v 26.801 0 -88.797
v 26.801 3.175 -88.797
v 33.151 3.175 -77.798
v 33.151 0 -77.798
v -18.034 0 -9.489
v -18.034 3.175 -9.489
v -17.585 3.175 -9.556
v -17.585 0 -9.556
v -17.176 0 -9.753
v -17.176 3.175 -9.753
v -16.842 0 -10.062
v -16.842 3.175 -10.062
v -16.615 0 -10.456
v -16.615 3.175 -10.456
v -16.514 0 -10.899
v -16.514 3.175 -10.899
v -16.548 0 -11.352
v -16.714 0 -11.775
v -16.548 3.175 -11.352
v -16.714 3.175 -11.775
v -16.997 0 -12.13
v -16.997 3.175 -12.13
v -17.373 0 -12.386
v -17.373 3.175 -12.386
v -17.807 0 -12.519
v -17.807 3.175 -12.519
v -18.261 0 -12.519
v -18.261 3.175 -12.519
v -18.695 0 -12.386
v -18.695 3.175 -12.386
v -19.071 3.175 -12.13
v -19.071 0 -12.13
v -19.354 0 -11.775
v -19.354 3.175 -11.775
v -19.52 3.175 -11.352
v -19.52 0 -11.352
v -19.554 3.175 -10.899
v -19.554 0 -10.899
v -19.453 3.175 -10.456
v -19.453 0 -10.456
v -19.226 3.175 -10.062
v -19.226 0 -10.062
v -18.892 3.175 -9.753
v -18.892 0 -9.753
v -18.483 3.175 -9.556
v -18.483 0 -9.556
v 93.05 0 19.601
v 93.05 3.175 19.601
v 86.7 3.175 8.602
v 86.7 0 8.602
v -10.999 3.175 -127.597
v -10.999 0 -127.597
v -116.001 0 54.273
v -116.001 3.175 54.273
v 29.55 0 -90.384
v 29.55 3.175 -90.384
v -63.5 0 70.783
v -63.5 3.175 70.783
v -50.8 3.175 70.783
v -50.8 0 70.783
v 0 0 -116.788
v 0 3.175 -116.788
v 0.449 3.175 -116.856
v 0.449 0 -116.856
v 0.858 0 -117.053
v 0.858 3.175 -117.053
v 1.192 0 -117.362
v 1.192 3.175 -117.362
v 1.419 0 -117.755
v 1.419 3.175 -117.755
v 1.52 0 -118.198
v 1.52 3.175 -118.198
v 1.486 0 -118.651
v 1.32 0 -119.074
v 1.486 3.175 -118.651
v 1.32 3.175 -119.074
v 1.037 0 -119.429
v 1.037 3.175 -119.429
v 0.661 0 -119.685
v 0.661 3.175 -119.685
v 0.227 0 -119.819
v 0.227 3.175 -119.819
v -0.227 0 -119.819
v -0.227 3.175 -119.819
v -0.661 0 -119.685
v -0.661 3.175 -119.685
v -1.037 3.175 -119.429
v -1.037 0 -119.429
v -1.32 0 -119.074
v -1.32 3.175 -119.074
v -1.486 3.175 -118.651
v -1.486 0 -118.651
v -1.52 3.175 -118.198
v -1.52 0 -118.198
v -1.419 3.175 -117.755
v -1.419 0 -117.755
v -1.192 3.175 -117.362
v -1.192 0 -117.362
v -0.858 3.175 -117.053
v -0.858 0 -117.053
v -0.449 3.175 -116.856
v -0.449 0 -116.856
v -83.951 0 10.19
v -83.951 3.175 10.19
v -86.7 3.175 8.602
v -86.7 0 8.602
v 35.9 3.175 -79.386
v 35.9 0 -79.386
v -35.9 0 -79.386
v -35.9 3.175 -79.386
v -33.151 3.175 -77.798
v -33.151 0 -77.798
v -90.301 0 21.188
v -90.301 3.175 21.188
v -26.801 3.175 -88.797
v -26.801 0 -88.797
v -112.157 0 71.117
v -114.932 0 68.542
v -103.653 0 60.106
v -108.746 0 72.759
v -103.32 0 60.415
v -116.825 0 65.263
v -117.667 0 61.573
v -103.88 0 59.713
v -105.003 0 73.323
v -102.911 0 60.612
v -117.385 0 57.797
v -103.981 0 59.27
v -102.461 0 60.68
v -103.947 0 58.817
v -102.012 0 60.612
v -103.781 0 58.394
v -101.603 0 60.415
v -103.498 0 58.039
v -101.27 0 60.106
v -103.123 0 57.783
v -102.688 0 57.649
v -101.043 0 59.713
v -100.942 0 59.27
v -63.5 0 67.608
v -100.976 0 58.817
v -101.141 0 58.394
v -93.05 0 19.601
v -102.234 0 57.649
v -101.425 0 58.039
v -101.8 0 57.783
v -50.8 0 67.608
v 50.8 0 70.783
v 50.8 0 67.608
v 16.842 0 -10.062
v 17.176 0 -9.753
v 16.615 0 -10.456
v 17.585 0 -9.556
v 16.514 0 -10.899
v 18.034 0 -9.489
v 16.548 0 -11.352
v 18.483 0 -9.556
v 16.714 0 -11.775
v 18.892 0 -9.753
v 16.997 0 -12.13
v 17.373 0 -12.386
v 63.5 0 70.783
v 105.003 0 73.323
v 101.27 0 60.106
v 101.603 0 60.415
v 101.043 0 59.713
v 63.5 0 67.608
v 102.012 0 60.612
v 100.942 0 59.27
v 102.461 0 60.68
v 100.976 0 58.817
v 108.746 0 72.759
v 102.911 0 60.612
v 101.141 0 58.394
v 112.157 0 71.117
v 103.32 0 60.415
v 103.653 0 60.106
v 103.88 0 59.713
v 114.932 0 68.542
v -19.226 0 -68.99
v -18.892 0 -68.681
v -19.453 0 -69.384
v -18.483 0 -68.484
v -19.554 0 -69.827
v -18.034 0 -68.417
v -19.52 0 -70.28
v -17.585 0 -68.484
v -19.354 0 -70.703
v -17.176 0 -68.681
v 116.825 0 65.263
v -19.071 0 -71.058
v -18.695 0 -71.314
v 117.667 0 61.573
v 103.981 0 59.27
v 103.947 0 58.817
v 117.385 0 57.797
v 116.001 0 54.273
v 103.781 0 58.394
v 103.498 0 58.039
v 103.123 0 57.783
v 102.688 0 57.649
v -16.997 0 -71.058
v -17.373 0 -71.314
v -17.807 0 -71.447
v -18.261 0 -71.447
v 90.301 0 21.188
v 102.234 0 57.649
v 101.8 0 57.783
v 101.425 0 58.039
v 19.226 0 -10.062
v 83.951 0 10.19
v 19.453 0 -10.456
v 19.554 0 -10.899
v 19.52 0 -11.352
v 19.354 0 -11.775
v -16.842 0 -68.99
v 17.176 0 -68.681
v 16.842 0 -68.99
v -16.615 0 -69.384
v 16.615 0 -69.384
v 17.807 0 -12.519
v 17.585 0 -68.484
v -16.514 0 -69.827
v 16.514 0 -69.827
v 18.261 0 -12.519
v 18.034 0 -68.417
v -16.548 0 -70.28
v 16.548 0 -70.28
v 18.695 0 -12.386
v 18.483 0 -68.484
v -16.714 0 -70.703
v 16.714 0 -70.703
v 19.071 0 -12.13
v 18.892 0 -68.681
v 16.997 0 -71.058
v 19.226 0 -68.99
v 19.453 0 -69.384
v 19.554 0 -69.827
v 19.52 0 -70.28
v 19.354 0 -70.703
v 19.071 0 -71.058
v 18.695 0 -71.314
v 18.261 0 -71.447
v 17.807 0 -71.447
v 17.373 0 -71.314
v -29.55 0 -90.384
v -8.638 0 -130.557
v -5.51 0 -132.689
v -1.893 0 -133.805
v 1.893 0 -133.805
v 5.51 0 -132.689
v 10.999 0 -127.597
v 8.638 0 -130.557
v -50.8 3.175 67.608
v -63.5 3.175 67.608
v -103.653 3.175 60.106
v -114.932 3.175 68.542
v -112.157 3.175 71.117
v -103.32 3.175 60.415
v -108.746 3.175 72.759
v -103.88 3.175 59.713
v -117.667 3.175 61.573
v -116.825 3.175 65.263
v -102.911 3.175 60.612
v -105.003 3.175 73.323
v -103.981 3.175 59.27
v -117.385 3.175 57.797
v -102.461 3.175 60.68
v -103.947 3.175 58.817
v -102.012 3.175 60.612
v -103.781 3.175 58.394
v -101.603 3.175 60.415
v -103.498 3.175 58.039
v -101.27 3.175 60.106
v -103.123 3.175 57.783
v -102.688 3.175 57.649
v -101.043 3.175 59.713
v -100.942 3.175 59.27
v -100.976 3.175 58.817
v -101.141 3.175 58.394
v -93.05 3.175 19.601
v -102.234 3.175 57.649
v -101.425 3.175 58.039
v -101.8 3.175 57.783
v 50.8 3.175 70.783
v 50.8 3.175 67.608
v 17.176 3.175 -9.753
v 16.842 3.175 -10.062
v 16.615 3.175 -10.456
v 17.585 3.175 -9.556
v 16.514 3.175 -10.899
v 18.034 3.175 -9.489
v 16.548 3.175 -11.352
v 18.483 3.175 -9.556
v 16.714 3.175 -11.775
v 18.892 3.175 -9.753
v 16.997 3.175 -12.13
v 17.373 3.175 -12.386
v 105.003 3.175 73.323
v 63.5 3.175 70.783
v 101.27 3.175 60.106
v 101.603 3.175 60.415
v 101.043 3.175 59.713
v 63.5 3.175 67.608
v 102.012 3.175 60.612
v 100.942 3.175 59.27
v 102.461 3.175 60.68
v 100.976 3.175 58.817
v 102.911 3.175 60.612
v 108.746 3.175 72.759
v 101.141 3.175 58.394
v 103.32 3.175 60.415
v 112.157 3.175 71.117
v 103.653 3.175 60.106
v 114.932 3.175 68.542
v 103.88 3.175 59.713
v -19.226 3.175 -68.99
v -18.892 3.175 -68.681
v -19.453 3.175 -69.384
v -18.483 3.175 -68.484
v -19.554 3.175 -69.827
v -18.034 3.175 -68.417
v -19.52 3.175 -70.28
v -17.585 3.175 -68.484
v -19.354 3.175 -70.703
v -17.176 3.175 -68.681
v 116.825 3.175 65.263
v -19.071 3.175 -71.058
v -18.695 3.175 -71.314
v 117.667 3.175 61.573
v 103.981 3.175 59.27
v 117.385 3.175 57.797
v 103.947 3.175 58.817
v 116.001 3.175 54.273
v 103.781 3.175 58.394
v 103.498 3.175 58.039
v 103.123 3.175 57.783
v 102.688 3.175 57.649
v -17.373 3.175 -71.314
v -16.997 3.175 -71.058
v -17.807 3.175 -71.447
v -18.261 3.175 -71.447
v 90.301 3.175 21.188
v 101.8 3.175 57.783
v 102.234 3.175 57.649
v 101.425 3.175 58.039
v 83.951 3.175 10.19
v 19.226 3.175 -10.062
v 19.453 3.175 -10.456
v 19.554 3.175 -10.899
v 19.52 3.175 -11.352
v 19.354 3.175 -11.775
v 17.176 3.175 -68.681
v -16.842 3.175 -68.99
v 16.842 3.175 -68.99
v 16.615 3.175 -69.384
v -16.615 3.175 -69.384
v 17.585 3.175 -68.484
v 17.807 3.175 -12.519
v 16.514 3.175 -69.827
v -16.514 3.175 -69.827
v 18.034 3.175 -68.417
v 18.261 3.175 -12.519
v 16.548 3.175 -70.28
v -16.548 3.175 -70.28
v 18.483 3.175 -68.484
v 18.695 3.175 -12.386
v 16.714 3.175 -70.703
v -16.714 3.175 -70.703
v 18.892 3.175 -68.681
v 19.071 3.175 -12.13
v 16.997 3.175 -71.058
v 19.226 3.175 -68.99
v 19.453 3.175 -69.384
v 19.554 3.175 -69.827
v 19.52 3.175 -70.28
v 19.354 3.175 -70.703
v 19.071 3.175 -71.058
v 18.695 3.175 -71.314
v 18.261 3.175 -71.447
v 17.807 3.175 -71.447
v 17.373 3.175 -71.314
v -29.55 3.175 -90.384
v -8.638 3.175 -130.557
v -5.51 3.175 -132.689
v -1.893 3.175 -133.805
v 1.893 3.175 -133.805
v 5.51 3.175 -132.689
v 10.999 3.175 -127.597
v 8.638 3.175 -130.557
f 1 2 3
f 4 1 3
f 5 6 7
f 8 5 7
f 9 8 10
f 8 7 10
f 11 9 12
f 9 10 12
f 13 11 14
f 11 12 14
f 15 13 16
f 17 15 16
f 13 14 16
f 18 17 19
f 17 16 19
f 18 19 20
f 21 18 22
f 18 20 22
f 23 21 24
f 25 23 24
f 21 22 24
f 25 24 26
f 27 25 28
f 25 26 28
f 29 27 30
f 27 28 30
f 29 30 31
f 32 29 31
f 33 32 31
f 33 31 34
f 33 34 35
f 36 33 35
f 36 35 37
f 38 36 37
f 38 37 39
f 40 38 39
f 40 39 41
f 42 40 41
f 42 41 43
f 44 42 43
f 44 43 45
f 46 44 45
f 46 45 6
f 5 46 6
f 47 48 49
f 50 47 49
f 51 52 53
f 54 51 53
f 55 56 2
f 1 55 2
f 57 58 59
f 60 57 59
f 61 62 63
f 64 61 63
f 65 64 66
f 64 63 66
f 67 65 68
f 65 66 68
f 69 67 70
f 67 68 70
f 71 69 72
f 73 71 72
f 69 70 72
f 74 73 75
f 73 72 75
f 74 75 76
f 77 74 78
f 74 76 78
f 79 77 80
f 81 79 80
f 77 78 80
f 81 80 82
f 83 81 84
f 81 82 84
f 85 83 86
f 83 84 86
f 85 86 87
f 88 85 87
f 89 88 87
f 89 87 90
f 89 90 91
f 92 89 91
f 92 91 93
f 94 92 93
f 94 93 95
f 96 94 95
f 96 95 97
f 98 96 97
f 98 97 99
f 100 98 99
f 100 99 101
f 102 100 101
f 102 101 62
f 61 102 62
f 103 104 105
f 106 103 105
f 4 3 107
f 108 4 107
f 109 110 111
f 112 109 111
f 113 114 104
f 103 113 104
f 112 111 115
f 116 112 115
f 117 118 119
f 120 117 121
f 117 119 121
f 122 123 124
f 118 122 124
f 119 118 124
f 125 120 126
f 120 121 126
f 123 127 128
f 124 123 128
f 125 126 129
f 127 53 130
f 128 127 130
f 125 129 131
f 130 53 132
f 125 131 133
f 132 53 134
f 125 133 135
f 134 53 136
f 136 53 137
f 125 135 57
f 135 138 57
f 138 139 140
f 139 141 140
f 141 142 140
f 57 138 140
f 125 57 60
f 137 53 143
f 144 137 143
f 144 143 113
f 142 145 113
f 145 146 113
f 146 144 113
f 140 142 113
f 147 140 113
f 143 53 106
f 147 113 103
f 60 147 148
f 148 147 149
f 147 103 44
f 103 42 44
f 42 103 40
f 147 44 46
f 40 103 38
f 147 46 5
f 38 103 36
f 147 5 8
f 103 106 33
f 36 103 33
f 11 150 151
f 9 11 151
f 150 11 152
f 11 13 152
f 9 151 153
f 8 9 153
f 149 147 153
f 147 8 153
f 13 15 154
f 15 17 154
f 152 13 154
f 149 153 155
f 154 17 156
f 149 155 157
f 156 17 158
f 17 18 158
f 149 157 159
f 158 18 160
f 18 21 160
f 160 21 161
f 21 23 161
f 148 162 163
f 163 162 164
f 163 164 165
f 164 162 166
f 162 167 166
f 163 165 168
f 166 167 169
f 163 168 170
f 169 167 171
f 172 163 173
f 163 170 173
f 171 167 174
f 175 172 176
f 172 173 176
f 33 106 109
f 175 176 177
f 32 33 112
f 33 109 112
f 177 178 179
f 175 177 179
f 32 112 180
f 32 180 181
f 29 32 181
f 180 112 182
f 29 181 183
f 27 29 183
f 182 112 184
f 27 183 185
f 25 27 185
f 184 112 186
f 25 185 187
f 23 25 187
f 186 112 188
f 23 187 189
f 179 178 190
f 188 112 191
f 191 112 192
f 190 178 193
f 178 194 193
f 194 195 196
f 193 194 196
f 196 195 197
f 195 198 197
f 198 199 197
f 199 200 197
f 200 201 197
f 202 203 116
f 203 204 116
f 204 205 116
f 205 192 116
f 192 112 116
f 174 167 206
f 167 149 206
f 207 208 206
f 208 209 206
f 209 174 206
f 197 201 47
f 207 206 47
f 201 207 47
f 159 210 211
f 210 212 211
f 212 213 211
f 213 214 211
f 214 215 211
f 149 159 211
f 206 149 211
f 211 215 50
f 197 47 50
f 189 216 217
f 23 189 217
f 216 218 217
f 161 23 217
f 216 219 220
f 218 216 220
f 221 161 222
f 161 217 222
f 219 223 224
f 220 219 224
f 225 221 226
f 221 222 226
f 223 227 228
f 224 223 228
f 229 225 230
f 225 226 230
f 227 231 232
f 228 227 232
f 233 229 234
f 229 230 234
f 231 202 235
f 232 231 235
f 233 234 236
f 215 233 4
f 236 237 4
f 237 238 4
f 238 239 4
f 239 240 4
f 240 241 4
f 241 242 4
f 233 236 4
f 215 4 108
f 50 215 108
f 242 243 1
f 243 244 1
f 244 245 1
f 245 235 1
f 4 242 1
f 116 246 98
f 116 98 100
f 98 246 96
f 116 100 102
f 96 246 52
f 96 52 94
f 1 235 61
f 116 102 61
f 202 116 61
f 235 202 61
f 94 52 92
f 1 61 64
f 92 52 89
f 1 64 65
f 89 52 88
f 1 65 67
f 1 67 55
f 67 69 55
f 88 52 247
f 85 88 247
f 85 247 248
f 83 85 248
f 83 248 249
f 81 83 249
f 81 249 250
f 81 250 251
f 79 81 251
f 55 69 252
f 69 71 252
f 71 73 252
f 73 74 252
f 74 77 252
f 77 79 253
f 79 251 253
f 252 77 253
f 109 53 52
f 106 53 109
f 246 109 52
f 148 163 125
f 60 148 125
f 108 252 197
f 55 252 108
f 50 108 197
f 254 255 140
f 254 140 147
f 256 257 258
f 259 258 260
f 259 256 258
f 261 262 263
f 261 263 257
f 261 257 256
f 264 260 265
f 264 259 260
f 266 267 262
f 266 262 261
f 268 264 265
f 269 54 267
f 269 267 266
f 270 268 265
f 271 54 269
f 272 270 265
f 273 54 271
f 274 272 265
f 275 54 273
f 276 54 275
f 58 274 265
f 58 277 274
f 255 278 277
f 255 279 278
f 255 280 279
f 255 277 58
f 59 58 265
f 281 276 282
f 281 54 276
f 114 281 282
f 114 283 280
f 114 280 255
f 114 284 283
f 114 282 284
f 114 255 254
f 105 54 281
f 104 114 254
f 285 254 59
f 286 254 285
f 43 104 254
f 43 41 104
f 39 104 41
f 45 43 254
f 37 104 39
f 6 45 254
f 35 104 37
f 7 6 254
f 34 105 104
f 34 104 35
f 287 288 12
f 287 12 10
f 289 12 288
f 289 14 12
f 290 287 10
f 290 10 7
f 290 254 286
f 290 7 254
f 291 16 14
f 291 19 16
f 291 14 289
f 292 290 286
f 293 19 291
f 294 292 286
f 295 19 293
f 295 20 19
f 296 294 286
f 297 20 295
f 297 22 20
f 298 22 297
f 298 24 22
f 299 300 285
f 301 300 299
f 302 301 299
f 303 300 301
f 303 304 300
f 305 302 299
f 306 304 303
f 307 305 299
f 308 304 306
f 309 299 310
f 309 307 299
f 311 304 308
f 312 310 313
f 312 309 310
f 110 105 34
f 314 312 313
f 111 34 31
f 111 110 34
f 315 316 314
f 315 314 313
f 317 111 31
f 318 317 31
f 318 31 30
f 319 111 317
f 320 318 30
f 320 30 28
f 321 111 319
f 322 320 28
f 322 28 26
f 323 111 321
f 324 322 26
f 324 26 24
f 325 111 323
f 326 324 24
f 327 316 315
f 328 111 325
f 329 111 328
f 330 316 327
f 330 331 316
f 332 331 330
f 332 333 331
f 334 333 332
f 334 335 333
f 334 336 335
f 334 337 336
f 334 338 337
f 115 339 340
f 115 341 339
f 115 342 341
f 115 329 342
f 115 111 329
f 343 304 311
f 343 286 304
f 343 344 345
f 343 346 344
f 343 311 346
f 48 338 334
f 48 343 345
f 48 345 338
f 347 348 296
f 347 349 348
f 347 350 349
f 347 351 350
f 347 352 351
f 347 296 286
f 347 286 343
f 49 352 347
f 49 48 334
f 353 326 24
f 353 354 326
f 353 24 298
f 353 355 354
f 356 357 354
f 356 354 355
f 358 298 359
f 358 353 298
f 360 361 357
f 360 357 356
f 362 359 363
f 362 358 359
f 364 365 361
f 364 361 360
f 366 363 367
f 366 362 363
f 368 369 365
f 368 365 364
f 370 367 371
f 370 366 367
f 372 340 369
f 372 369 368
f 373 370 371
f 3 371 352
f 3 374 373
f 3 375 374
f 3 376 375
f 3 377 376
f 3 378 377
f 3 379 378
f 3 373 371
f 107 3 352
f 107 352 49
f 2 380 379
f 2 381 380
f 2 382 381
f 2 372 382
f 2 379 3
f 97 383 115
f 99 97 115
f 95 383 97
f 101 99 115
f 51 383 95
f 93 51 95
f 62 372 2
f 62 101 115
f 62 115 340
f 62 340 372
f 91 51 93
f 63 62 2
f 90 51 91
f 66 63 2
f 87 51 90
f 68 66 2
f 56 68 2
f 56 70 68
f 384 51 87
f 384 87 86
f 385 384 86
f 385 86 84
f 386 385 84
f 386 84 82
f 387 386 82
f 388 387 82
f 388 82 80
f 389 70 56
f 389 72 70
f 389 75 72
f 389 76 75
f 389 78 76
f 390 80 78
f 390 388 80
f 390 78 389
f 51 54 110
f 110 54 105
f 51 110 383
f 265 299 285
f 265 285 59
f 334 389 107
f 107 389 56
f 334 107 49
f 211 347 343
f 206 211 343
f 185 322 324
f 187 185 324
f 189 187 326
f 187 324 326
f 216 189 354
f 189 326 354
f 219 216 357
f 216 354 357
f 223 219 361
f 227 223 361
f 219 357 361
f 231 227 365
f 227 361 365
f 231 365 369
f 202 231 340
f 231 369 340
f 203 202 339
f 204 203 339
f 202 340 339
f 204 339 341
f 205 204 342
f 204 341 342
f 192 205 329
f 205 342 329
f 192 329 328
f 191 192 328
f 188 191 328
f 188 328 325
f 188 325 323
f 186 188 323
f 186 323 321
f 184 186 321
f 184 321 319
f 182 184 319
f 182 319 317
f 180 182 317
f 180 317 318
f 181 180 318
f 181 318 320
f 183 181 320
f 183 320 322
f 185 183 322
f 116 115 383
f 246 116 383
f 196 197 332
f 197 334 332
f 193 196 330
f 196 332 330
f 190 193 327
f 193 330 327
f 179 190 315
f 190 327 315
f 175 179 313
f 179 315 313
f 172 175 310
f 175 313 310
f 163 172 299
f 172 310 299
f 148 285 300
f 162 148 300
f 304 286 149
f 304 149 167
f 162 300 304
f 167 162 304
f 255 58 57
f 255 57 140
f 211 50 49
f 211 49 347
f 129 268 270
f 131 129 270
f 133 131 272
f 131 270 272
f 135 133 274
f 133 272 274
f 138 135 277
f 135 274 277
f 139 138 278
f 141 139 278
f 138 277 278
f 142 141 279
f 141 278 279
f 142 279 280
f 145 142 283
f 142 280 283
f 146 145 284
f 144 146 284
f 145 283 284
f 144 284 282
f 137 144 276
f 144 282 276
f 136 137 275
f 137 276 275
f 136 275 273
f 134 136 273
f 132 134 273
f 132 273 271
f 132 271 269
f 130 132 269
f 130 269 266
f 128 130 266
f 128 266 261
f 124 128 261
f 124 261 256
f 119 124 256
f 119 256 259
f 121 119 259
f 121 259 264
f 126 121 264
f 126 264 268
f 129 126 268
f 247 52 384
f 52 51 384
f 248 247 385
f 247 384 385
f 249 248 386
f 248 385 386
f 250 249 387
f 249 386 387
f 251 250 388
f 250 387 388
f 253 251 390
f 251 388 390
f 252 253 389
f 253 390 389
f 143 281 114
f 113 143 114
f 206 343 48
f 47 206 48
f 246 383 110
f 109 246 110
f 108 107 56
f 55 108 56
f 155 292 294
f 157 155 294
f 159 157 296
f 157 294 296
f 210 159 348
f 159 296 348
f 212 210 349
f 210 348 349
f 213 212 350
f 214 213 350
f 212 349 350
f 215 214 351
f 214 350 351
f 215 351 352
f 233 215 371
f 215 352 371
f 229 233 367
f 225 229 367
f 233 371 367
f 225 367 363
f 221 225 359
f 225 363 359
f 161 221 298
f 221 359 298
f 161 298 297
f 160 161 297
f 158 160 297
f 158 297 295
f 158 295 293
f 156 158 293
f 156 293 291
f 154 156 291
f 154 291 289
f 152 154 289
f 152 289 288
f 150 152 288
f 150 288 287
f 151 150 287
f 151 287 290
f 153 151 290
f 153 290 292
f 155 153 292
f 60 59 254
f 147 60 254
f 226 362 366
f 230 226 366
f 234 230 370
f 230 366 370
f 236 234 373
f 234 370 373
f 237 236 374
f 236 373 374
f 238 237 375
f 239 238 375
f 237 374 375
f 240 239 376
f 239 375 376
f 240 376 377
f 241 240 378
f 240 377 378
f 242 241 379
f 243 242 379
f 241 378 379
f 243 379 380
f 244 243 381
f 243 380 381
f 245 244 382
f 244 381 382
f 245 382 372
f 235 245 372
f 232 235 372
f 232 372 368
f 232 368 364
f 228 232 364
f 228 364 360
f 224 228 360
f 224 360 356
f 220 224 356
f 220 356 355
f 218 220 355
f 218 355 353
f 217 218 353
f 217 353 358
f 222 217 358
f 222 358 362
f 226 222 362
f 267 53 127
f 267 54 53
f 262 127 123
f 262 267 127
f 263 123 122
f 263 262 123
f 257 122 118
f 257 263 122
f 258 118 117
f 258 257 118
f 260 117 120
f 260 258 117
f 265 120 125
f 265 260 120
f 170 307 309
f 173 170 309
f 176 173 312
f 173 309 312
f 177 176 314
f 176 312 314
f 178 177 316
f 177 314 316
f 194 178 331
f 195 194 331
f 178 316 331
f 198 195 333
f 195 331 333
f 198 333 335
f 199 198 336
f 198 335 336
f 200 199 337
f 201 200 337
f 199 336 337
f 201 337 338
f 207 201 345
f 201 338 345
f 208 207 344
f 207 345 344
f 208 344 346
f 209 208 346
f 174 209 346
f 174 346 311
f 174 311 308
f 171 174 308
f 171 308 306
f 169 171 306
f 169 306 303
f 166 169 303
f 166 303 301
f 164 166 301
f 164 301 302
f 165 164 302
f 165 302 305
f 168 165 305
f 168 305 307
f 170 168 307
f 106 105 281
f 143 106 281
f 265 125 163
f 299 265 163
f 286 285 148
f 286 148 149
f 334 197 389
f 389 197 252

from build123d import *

# Parameters (mm, degrees)
BOSS_EXTRUDE1_DEPTH = 3.175
SKETCH2_R           = 1.524
CUT_EXTRUDE2_DEPTH  = 195.021684248
FILLET1_R           = 12.7
SKETCH3_W           = 12.7
SKETCH3_H           = 3.175
CUT_EXTRUDE3_DEPTH  = 179.341965104
SKETCH4_R           = 1.524
CUT_EXTRUDE4_DEPTH  = 179.341965104


with BuildPart() as part:
    # Sketch1 → Boss-Extrude1 (new body)
    with BuildSketch(Plane(origin=(0, 0, 0), x_dir=(1, 0, 0), z_dir=(0, 1, 0))):
        Polygon((0, 146.646968374), (-127, -73.323484187), (127, -73.323484187), align=None)
    extrude(amount=BOSS_EXTRUDE1_DEPTH)

    # Sketch2 → Cut-Extrude2 (cut, through all)
    with BuildSketch(Plane(origin=(0, 3.175, 0), x_dir=(1, 0, 0), z_dir=(0, 1, 0))):
        with Locations((-102.461318102, -59.156069588)):
            Circle(SKETCH2_R)
        with Locations((102.461318102, -59.156069588)):
            Circle(SKETCH2_R)
        with Locations((0, 118.312139176)):
            Circle(SKETCH2_R)
    extrude(amount=-CUT_EXTRUDE2_DEPTH, mode=Mode.SUBTRACT)

    # Fillet1
    fillet1_edges = [part.edges().sort_by_distance(p)[0] for p in [
        (-127, 1.5875, 73.323484187),
        (0, 1.5875, -146.646968374),
        (127, 1.5875, 73.323484187),
    ]]
    fillet(fillet1_edges, radius=FILLET1_R)

    # Sketch3 → Cut-Extrude3 (cut, through all)
    with BuildSketch(Plane(origin=(0, 3.175, 0), x_dir=(1, 0, 0), z_dir=(0, 1, 0))):
        Polygon((93.050295474, -19.600871047), (86.700295474, -8.602348419), (83.950664817, -10.189848419), (90.300664817, -21.188371047), align=None)
        Polygon((33.150664817, 77.798332606), (35.900295474, 79.385832606), (29.550295474, 90.384355234), (26.800664817, 88.796855234), align=None)
        with Locations((-57.15, -69.195984187)):
            Rectangle(SKETCH3_W, SKETCH3_H)
        with Locations((57.15, -69.195984187)):
            Rectangle(SKETCH3_W, SKETCH3_H)
        Polygon((-29.550295474, 90.384355234), (-35.900295474, 79.385832606), (-33.150664817, 77.798332606), (-26.800664817, 88.796855234), align=None)
        Polygon((-83.950664817, -10.189848419), (-86.700295474, -8.602348419), (-93.050295474, -19.600871047), (-90.300664817, -21.188371047), align=None)
    extrude(amount=-CUT_EXTRUDE3_DEPTH, mode=Mode.SUBTRACT)

    # Sketch4 → Cut-Extrude4 (cut, through all)
    with BuildSketch(Plane(origin=(0, 3.175, 0), x_dir=(1, 0, 0), z_dir=(0, 1, 0))):
        with Locations((-18.034, 69.940515813)):
            Circle(SKETCH4_R)
        with Locations((18.034, 69.940515813)):
            Circle(SKETCH4_R)
        with Locations((-18.034, 11.012515813)):
            Circle(SKETCH4_R)
        with Locations((18.034, 11.012515813)):
            Circle(SKETCH4_R)
    extrude(amount=-CUT_EXTRUDE4_DEPTH, mode=Mode.SUBTRACT)


solid = part.part
